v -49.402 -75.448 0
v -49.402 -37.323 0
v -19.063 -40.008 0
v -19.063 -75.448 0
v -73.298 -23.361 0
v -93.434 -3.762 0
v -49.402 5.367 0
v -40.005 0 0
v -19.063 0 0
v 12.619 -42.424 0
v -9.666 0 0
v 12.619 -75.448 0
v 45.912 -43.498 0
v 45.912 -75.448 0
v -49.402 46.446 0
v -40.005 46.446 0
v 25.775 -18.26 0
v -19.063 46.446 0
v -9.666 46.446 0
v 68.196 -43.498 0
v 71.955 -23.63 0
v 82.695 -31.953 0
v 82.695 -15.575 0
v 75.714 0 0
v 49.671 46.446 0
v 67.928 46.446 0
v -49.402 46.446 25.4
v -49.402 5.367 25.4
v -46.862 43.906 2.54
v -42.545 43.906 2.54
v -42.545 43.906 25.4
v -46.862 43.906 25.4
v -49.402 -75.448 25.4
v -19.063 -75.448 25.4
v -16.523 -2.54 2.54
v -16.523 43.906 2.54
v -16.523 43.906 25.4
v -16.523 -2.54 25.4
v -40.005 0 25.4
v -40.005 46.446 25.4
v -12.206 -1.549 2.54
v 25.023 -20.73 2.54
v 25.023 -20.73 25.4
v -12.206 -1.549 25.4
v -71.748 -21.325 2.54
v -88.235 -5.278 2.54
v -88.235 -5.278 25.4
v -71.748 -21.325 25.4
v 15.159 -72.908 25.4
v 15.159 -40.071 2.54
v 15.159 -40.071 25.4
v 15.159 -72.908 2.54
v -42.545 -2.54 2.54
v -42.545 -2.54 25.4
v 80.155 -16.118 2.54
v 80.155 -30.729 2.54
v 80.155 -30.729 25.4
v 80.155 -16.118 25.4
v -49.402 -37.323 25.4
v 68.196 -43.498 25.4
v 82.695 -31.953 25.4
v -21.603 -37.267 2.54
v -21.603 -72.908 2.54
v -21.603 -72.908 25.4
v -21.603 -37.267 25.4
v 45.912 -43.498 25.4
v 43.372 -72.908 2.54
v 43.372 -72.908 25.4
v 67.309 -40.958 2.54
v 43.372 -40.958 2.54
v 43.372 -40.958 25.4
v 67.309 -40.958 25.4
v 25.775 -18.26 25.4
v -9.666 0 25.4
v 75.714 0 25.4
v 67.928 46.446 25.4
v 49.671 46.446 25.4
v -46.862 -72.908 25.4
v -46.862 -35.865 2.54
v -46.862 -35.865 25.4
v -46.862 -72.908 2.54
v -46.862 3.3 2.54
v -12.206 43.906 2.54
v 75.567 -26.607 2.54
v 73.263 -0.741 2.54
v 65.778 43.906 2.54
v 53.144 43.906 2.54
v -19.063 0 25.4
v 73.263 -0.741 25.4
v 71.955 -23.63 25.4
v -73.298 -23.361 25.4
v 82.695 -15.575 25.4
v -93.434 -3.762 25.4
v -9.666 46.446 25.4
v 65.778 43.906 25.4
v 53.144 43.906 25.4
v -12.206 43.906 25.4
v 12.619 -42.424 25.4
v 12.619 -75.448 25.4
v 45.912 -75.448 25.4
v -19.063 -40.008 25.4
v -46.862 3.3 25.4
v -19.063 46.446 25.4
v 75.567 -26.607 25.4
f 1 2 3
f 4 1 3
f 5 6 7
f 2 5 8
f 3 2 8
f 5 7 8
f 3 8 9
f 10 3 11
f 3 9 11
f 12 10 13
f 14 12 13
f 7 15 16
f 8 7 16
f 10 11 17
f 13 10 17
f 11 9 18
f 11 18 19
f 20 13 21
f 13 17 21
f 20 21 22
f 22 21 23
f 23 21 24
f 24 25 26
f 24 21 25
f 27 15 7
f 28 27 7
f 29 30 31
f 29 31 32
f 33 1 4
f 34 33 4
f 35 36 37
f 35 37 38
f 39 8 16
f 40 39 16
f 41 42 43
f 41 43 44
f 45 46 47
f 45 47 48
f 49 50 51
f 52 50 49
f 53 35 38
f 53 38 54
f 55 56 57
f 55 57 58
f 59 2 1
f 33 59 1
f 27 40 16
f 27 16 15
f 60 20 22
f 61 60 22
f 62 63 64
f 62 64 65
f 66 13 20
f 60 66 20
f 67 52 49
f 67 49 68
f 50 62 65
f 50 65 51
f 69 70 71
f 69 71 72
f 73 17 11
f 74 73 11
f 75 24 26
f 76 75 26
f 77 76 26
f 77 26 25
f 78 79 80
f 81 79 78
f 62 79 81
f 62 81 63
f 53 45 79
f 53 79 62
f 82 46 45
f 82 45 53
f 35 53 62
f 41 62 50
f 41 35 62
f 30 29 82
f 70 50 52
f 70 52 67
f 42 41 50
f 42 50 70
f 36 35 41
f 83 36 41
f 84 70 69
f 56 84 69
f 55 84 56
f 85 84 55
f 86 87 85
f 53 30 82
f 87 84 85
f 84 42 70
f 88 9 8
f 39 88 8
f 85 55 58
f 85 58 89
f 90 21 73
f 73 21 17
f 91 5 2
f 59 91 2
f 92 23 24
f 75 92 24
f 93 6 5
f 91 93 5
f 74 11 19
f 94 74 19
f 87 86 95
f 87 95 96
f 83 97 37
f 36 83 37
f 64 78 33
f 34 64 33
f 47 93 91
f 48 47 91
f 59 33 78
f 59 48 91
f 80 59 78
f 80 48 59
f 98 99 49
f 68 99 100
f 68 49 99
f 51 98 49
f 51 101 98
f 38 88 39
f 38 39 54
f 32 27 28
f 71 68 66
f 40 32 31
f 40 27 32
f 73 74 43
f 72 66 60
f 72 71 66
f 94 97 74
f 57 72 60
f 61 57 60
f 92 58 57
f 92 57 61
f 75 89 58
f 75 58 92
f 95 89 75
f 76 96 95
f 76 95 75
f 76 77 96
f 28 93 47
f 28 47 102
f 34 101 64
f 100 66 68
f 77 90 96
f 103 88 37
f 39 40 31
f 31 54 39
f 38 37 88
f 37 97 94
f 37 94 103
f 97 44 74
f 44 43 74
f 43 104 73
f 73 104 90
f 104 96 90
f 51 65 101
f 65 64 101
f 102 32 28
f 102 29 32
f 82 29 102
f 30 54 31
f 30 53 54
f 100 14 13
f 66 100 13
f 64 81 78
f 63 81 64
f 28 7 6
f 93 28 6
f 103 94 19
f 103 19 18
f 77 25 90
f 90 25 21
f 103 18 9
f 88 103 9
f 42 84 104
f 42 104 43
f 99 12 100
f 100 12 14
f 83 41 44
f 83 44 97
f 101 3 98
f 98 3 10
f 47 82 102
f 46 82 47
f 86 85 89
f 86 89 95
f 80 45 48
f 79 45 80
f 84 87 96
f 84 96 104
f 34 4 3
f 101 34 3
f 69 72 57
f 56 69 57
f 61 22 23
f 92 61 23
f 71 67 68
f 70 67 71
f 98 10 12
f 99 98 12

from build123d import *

# Parameters (mm, degrees)
F1_DEPTH = 25.4
F2_T     = -2.54


with BuildPart() as f1:
    # F0 (on Top) → F1 (new body)
    with BuildSketch(Plane.XY):
        Polygon((-40.0050021708, 46.4459620416), (-49.4021475315, 46.4459620416), (-49.4021475315, 5.3670029156), (-93.434497714, -3.7616554182), (-73.2977539301, -23.3614202589), (-49.4021475315, -37.322897464), (-49.4021475315, -75.4484683275), (-19.0627854317, -75.4484683275), (-19.0627854317, -40.0077961385), (12.6190278679, -42.4242056906), (12.6190278679, -75.4484683275), (45.9117777646, -75.4484683275), (45.9117777646, -43.4981659055), (68.1964457035, -43.4981659055), (82.6948955655, -31.9531001151), (82.6948955655, -15.5752124265), (75.7141634822, 0), (67.9279565811, 46.4459620416), (49.6706403792, 46.4459620416), (71.9553008676, -23.6299112439), (25.7750339806, -18.2601120323), (-9.6656382084, 0), (-9.6656382084, 46.4459620416), (-19.0627854317, 46.4459620416), (-19.0627854317, 0), (-40.0050021708, 0), align=None)
    extrude(amount=F1_DEPTH)

    # F2
    f2_openings = [f1.faces().sort_by_distance(p)[0] for p in [
        (-1.371723, -22.717213, 25.4),
    ]]
    offset(amount=F2_T, openings=f2_openings, kind=Kind.INTERSECTION)


solid = f1.part
